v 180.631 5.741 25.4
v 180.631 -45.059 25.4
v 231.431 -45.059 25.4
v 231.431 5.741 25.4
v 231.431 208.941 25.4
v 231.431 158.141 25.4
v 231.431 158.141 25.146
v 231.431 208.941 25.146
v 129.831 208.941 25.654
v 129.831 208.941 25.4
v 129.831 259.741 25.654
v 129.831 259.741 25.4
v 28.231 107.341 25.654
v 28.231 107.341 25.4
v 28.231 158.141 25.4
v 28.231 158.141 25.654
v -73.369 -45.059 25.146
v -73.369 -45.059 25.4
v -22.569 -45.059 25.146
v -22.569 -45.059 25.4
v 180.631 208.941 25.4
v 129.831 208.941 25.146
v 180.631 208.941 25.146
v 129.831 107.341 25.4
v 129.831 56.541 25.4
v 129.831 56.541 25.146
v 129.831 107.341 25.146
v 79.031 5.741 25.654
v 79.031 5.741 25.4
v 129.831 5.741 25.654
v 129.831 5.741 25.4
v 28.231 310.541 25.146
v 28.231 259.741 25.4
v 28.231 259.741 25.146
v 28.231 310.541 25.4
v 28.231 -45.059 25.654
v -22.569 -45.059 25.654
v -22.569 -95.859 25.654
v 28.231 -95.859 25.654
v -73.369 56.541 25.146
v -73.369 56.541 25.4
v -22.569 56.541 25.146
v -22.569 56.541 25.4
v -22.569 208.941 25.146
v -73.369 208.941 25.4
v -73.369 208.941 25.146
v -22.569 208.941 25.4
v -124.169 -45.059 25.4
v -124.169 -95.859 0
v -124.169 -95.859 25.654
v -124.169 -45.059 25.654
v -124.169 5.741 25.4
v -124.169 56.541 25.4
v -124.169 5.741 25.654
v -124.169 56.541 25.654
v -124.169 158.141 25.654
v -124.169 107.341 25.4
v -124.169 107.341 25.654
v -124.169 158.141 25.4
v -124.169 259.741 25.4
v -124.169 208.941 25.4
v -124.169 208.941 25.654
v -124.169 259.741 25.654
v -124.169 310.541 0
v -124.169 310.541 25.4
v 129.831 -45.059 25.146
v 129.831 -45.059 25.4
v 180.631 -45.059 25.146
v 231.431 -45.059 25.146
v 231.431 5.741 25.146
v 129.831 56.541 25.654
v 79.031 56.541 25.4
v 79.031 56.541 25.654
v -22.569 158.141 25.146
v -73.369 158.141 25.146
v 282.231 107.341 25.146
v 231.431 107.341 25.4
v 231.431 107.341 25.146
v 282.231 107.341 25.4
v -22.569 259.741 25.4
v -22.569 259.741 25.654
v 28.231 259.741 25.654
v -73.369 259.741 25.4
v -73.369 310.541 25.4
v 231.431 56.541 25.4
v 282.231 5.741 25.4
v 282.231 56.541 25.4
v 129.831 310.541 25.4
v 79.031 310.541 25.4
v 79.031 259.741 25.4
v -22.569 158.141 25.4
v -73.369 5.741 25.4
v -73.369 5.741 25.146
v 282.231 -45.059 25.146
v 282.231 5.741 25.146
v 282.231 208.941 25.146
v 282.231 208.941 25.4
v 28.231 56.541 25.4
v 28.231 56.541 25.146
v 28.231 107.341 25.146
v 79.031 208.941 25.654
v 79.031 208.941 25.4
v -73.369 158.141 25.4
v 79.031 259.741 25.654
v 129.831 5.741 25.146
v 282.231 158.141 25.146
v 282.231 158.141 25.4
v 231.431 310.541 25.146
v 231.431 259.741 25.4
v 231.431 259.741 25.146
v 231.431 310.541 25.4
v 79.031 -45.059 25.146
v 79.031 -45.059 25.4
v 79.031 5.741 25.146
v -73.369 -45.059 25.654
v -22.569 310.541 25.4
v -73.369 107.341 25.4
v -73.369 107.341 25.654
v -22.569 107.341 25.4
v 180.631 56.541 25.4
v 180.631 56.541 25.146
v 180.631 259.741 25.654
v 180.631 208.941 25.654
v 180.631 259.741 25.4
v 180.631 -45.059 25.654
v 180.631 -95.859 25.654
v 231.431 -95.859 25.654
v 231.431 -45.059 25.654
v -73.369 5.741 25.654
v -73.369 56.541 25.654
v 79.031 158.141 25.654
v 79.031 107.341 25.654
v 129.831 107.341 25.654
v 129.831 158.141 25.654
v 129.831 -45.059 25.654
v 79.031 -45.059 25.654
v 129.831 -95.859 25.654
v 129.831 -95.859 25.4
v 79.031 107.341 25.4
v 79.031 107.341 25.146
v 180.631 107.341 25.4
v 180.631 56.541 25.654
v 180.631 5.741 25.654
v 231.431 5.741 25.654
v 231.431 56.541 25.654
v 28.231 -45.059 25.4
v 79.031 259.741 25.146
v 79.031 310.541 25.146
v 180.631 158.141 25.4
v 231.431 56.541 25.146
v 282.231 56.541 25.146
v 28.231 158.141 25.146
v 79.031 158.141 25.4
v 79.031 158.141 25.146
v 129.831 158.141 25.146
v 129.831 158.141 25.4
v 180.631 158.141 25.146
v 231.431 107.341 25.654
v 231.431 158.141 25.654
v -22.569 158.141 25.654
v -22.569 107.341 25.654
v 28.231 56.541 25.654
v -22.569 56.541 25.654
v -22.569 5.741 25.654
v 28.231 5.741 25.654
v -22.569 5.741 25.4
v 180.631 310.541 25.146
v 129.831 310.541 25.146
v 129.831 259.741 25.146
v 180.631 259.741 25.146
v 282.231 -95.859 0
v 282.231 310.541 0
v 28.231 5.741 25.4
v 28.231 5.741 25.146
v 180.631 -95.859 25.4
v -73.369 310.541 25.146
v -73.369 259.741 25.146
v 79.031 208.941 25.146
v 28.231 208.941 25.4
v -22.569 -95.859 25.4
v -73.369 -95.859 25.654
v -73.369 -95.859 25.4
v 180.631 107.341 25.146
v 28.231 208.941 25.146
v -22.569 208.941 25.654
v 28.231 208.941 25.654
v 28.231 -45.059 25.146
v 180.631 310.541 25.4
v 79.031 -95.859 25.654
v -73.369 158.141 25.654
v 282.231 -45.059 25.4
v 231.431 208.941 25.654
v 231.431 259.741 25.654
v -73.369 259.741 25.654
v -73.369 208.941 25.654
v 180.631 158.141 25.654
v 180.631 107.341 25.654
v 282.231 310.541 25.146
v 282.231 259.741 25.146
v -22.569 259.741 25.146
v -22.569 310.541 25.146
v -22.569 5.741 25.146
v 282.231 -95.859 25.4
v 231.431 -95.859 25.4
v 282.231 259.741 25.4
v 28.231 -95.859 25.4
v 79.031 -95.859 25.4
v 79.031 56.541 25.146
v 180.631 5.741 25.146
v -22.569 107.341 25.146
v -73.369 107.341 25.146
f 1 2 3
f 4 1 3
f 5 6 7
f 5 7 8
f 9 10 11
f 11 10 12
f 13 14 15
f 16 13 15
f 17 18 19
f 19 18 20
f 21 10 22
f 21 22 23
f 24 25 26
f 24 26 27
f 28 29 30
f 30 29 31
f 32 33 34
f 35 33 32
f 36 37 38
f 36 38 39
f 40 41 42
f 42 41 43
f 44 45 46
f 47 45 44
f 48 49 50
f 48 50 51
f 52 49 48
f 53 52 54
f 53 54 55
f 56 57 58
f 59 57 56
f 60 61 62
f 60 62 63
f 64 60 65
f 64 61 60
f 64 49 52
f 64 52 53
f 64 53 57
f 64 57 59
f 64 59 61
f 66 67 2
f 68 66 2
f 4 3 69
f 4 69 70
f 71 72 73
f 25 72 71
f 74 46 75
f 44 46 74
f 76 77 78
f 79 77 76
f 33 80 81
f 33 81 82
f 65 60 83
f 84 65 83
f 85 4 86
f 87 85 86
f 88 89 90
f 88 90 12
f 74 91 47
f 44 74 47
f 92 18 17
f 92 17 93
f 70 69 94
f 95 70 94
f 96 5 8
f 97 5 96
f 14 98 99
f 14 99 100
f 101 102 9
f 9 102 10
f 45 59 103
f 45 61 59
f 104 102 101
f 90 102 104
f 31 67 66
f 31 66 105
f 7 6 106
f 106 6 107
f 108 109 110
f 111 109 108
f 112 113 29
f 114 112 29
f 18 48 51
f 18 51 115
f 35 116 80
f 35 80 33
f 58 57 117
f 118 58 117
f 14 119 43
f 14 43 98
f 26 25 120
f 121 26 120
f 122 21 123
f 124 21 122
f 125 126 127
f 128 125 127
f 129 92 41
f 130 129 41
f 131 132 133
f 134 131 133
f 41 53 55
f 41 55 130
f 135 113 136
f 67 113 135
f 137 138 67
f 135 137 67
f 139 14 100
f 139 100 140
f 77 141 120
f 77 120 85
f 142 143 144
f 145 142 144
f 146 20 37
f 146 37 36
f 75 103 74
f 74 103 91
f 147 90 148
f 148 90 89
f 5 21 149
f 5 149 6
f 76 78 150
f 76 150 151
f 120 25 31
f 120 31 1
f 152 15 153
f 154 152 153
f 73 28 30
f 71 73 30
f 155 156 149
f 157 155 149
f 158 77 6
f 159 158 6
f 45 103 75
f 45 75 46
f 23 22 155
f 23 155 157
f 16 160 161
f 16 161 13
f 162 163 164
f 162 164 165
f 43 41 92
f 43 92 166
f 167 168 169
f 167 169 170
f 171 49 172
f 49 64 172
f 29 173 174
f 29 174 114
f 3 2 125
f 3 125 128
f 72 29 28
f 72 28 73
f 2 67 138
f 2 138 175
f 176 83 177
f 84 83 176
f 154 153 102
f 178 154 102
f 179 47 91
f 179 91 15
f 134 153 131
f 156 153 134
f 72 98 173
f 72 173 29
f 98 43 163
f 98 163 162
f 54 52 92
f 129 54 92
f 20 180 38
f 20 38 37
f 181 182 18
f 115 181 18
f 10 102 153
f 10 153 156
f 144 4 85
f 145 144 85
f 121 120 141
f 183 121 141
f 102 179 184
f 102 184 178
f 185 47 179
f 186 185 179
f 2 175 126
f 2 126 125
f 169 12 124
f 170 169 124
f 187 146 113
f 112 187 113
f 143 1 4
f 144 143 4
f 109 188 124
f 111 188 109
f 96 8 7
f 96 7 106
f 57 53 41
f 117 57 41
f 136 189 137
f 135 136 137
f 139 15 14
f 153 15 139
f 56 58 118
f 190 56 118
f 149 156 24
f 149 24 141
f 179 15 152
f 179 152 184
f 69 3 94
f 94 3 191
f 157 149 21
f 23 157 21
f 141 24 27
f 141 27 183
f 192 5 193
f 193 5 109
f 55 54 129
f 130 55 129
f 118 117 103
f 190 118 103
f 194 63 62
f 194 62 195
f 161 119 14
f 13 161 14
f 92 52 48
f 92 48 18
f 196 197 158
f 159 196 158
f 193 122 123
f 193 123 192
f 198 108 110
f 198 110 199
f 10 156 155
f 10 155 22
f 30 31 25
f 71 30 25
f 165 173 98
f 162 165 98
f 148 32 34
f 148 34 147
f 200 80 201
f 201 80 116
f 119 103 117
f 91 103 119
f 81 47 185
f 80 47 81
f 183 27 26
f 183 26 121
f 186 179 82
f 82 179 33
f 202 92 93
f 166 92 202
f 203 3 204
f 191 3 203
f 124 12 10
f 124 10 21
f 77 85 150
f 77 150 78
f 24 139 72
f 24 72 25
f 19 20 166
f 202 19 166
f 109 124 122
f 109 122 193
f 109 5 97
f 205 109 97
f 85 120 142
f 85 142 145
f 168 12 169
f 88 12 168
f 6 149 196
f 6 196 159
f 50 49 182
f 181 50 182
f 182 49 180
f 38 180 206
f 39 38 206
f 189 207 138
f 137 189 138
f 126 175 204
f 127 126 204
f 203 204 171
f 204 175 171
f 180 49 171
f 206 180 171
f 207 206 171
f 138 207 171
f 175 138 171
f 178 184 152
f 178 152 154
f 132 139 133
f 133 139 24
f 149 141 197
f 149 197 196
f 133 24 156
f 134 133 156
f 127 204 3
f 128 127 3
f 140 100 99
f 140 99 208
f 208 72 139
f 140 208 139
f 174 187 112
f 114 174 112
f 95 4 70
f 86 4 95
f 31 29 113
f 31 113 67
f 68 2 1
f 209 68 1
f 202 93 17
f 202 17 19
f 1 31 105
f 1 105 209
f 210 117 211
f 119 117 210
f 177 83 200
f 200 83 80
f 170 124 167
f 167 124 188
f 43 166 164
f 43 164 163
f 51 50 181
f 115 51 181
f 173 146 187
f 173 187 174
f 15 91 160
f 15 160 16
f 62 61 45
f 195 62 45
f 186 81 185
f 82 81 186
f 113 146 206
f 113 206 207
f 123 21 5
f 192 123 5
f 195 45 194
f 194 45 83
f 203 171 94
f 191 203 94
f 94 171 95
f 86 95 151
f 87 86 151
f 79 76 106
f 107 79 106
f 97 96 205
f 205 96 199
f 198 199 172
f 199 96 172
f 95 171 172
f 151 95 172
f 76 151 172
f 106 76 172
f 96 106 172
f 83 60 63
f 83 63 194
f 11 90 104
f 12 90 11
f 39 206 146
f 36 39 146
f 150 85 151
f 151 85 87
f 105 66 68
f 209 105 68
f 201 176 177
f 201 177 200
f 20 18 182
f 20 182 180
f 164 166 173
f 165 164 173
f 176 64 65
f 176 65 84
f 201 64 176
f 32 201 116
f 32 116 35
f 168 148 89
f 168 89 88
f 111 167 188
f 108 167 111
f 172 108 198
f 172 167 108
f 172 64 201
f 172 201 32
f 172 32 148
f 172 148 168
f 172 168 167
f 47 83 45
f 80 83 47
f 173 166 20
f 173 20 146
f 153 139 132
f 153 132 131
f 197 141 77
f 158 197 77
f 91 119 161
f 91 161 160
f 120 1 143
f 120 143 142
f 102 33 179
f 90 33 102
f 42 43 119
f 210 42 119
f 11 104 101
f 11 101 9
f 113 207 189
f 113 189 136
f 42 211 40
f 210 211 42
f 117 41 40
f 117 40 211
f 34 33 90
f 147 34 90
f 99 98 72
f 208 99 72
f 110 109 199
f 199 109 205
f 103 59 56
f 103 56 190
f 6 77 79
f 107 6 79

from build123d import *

# Parameters (mm, degrees)
F0_W          = 406.4
F0_H          = 406.4
F1_DEPTH      = 25.4
F2_W          = 50.8
F2_H          = 50.8
F3_DEPTH      = 0.254
F3_DEPTH_BACK = 25.4
F4_W          = 50.8
F4_H          = 50.8
F5_DEPTH      = 0.254


with BuildPart() as f1:
    # F0 (on Top) → F1 (new body)
    with BuildSketch(Plane.XY):
        with Locations((79.0308928013, 107.3409973125)):
            Rectangle(F0_W, F0_H)
    extrude(amount=F1_DEPTH)

    # F2 (on face) → F3 (join, two sides)
    with BuildSketch(Plane.XY.offset(25.4)) as f3_sk:
        with Locations((-98.7691071987, -70.4590026875)):
            Rectangle(F2_W, F2_H)
        with Locations((-98.7691071987, 31.1409973125)):
            Rectangle(F2_W, F2_H)
        with Locations((-98.7691071987, 132.7409973125)):
            Rectangle(F2_W, F2_H)
        with Locations((-98.7691071987, 234.3409973125)):
            Rectangle(F2_W, F2_H)
        with Locations((2.8308928013, -70.4590026875)):
            Rectangle(F2_W, F2_H)
        with Locations((2.8308928013, 31.1409973125)):
            Rectangle(F2_W, F2_H)
        with Locations((2.8308928013, 132.7409973125)):
            Rectangle(F2_W, F2_H)
        with Locations((2.8308928013, 234.3409973125)):
            Rectangle(F2_W, F2_H)
        with Locations((104.4308928013, -70.4590026875)):
            Rectangle(F2_W, F2_H)
        with Locations((104.4308928013, 31.1409973125)):
            Rectangle(F2_W, F2_H)
        with Locations((104.4308928013, 132.7409973125)):
            Rectangle(F2_W, F2_H)
        with Locations((104.4308928013, 234.3409973125)):
            Rectangle(F2_W, F2_H)
        with Locations((206.0308928013, -70.4590026875)):
            Rectangle(F2_W, F2_H)
        with Locations((206.0308928013, 31.1409973125)):
            Rectangle(F2_W, F2_H)
        with Locations((206.0308928013, 132.7409973125)):
            Rectangle(F2_W, F2_H)
        with Locations((206.0308928013, 234.3409973125)):
            Rectangle(F2_W, F2_H)
    extrude(amount=F3_DEPTH)
    extrude(f3_sk.sketch, amount=-F3_DEPTH_BACK)

    # F4 (on face) → F5 (cut)
    with BuildSketch(Plane.XY.offset(25.4)):
        with Locations((-47.9691071987, -19.6590026875)):
            Rectangle(F4_W, F4_H)
        with Locations((-47.9691071987, 81.9409973125)):
            Rectangle(F4_W, F4_H)
        with Locations((-47.9691071987, 183.5409973125)):
            Rectangle(F4_W, F4_H)
        with Locations((-47.9691071987, 285.1409973125)):
            Rectangle(F4_W, F4_H)
        with Locations((53.6308928013, 285.1409973125)):
            Rectangle(F4_W, F4_H)
        with Locations((53.6308928013, 183.5409973125)):
            Rectangle(F4_W, F4_H)
        with Locations((53.6308928013, 81.9409973125)):
            Rectangle(F4_W, F4_H)
        with Locations((53.6308928013, -19.6590026875)):
            Rectangle(F4_W, F4_H)
        with Locations((155.2308928013, -19.6590026875)):
            Rectangle(F4_W, F4_H)
        with Locations((155.2308928013, 81.9409973125)):
            Rectangle(F4_W, F4_H)
        with Locations((155.2308928013, 183.5409973125)):
            Rectangle(F4_W, F4_H)
        with Locations((155.2308928013, 285.1409973125)):
            Rectangle(F4_W, F4_H)
        with Locations((256.8308928013, 285.1409973125)):
            Rectangle(F4_W, F4_H)
        with Locations((256.8308928013, 183.5409973125)):
            Rectangle(F4_W, F4_H)
        with Locations((256.8308928013, 81.9409973125)):
            Rectangle(F4_W, F4_H)
        with Locations((256.8308928013, -19.6590026875)):
            Rectangle(F4_W, F4_H)
    extrude(amount=-F5_DEPTH, mode=Mode.SUBTRACT)


solid = f1.part
